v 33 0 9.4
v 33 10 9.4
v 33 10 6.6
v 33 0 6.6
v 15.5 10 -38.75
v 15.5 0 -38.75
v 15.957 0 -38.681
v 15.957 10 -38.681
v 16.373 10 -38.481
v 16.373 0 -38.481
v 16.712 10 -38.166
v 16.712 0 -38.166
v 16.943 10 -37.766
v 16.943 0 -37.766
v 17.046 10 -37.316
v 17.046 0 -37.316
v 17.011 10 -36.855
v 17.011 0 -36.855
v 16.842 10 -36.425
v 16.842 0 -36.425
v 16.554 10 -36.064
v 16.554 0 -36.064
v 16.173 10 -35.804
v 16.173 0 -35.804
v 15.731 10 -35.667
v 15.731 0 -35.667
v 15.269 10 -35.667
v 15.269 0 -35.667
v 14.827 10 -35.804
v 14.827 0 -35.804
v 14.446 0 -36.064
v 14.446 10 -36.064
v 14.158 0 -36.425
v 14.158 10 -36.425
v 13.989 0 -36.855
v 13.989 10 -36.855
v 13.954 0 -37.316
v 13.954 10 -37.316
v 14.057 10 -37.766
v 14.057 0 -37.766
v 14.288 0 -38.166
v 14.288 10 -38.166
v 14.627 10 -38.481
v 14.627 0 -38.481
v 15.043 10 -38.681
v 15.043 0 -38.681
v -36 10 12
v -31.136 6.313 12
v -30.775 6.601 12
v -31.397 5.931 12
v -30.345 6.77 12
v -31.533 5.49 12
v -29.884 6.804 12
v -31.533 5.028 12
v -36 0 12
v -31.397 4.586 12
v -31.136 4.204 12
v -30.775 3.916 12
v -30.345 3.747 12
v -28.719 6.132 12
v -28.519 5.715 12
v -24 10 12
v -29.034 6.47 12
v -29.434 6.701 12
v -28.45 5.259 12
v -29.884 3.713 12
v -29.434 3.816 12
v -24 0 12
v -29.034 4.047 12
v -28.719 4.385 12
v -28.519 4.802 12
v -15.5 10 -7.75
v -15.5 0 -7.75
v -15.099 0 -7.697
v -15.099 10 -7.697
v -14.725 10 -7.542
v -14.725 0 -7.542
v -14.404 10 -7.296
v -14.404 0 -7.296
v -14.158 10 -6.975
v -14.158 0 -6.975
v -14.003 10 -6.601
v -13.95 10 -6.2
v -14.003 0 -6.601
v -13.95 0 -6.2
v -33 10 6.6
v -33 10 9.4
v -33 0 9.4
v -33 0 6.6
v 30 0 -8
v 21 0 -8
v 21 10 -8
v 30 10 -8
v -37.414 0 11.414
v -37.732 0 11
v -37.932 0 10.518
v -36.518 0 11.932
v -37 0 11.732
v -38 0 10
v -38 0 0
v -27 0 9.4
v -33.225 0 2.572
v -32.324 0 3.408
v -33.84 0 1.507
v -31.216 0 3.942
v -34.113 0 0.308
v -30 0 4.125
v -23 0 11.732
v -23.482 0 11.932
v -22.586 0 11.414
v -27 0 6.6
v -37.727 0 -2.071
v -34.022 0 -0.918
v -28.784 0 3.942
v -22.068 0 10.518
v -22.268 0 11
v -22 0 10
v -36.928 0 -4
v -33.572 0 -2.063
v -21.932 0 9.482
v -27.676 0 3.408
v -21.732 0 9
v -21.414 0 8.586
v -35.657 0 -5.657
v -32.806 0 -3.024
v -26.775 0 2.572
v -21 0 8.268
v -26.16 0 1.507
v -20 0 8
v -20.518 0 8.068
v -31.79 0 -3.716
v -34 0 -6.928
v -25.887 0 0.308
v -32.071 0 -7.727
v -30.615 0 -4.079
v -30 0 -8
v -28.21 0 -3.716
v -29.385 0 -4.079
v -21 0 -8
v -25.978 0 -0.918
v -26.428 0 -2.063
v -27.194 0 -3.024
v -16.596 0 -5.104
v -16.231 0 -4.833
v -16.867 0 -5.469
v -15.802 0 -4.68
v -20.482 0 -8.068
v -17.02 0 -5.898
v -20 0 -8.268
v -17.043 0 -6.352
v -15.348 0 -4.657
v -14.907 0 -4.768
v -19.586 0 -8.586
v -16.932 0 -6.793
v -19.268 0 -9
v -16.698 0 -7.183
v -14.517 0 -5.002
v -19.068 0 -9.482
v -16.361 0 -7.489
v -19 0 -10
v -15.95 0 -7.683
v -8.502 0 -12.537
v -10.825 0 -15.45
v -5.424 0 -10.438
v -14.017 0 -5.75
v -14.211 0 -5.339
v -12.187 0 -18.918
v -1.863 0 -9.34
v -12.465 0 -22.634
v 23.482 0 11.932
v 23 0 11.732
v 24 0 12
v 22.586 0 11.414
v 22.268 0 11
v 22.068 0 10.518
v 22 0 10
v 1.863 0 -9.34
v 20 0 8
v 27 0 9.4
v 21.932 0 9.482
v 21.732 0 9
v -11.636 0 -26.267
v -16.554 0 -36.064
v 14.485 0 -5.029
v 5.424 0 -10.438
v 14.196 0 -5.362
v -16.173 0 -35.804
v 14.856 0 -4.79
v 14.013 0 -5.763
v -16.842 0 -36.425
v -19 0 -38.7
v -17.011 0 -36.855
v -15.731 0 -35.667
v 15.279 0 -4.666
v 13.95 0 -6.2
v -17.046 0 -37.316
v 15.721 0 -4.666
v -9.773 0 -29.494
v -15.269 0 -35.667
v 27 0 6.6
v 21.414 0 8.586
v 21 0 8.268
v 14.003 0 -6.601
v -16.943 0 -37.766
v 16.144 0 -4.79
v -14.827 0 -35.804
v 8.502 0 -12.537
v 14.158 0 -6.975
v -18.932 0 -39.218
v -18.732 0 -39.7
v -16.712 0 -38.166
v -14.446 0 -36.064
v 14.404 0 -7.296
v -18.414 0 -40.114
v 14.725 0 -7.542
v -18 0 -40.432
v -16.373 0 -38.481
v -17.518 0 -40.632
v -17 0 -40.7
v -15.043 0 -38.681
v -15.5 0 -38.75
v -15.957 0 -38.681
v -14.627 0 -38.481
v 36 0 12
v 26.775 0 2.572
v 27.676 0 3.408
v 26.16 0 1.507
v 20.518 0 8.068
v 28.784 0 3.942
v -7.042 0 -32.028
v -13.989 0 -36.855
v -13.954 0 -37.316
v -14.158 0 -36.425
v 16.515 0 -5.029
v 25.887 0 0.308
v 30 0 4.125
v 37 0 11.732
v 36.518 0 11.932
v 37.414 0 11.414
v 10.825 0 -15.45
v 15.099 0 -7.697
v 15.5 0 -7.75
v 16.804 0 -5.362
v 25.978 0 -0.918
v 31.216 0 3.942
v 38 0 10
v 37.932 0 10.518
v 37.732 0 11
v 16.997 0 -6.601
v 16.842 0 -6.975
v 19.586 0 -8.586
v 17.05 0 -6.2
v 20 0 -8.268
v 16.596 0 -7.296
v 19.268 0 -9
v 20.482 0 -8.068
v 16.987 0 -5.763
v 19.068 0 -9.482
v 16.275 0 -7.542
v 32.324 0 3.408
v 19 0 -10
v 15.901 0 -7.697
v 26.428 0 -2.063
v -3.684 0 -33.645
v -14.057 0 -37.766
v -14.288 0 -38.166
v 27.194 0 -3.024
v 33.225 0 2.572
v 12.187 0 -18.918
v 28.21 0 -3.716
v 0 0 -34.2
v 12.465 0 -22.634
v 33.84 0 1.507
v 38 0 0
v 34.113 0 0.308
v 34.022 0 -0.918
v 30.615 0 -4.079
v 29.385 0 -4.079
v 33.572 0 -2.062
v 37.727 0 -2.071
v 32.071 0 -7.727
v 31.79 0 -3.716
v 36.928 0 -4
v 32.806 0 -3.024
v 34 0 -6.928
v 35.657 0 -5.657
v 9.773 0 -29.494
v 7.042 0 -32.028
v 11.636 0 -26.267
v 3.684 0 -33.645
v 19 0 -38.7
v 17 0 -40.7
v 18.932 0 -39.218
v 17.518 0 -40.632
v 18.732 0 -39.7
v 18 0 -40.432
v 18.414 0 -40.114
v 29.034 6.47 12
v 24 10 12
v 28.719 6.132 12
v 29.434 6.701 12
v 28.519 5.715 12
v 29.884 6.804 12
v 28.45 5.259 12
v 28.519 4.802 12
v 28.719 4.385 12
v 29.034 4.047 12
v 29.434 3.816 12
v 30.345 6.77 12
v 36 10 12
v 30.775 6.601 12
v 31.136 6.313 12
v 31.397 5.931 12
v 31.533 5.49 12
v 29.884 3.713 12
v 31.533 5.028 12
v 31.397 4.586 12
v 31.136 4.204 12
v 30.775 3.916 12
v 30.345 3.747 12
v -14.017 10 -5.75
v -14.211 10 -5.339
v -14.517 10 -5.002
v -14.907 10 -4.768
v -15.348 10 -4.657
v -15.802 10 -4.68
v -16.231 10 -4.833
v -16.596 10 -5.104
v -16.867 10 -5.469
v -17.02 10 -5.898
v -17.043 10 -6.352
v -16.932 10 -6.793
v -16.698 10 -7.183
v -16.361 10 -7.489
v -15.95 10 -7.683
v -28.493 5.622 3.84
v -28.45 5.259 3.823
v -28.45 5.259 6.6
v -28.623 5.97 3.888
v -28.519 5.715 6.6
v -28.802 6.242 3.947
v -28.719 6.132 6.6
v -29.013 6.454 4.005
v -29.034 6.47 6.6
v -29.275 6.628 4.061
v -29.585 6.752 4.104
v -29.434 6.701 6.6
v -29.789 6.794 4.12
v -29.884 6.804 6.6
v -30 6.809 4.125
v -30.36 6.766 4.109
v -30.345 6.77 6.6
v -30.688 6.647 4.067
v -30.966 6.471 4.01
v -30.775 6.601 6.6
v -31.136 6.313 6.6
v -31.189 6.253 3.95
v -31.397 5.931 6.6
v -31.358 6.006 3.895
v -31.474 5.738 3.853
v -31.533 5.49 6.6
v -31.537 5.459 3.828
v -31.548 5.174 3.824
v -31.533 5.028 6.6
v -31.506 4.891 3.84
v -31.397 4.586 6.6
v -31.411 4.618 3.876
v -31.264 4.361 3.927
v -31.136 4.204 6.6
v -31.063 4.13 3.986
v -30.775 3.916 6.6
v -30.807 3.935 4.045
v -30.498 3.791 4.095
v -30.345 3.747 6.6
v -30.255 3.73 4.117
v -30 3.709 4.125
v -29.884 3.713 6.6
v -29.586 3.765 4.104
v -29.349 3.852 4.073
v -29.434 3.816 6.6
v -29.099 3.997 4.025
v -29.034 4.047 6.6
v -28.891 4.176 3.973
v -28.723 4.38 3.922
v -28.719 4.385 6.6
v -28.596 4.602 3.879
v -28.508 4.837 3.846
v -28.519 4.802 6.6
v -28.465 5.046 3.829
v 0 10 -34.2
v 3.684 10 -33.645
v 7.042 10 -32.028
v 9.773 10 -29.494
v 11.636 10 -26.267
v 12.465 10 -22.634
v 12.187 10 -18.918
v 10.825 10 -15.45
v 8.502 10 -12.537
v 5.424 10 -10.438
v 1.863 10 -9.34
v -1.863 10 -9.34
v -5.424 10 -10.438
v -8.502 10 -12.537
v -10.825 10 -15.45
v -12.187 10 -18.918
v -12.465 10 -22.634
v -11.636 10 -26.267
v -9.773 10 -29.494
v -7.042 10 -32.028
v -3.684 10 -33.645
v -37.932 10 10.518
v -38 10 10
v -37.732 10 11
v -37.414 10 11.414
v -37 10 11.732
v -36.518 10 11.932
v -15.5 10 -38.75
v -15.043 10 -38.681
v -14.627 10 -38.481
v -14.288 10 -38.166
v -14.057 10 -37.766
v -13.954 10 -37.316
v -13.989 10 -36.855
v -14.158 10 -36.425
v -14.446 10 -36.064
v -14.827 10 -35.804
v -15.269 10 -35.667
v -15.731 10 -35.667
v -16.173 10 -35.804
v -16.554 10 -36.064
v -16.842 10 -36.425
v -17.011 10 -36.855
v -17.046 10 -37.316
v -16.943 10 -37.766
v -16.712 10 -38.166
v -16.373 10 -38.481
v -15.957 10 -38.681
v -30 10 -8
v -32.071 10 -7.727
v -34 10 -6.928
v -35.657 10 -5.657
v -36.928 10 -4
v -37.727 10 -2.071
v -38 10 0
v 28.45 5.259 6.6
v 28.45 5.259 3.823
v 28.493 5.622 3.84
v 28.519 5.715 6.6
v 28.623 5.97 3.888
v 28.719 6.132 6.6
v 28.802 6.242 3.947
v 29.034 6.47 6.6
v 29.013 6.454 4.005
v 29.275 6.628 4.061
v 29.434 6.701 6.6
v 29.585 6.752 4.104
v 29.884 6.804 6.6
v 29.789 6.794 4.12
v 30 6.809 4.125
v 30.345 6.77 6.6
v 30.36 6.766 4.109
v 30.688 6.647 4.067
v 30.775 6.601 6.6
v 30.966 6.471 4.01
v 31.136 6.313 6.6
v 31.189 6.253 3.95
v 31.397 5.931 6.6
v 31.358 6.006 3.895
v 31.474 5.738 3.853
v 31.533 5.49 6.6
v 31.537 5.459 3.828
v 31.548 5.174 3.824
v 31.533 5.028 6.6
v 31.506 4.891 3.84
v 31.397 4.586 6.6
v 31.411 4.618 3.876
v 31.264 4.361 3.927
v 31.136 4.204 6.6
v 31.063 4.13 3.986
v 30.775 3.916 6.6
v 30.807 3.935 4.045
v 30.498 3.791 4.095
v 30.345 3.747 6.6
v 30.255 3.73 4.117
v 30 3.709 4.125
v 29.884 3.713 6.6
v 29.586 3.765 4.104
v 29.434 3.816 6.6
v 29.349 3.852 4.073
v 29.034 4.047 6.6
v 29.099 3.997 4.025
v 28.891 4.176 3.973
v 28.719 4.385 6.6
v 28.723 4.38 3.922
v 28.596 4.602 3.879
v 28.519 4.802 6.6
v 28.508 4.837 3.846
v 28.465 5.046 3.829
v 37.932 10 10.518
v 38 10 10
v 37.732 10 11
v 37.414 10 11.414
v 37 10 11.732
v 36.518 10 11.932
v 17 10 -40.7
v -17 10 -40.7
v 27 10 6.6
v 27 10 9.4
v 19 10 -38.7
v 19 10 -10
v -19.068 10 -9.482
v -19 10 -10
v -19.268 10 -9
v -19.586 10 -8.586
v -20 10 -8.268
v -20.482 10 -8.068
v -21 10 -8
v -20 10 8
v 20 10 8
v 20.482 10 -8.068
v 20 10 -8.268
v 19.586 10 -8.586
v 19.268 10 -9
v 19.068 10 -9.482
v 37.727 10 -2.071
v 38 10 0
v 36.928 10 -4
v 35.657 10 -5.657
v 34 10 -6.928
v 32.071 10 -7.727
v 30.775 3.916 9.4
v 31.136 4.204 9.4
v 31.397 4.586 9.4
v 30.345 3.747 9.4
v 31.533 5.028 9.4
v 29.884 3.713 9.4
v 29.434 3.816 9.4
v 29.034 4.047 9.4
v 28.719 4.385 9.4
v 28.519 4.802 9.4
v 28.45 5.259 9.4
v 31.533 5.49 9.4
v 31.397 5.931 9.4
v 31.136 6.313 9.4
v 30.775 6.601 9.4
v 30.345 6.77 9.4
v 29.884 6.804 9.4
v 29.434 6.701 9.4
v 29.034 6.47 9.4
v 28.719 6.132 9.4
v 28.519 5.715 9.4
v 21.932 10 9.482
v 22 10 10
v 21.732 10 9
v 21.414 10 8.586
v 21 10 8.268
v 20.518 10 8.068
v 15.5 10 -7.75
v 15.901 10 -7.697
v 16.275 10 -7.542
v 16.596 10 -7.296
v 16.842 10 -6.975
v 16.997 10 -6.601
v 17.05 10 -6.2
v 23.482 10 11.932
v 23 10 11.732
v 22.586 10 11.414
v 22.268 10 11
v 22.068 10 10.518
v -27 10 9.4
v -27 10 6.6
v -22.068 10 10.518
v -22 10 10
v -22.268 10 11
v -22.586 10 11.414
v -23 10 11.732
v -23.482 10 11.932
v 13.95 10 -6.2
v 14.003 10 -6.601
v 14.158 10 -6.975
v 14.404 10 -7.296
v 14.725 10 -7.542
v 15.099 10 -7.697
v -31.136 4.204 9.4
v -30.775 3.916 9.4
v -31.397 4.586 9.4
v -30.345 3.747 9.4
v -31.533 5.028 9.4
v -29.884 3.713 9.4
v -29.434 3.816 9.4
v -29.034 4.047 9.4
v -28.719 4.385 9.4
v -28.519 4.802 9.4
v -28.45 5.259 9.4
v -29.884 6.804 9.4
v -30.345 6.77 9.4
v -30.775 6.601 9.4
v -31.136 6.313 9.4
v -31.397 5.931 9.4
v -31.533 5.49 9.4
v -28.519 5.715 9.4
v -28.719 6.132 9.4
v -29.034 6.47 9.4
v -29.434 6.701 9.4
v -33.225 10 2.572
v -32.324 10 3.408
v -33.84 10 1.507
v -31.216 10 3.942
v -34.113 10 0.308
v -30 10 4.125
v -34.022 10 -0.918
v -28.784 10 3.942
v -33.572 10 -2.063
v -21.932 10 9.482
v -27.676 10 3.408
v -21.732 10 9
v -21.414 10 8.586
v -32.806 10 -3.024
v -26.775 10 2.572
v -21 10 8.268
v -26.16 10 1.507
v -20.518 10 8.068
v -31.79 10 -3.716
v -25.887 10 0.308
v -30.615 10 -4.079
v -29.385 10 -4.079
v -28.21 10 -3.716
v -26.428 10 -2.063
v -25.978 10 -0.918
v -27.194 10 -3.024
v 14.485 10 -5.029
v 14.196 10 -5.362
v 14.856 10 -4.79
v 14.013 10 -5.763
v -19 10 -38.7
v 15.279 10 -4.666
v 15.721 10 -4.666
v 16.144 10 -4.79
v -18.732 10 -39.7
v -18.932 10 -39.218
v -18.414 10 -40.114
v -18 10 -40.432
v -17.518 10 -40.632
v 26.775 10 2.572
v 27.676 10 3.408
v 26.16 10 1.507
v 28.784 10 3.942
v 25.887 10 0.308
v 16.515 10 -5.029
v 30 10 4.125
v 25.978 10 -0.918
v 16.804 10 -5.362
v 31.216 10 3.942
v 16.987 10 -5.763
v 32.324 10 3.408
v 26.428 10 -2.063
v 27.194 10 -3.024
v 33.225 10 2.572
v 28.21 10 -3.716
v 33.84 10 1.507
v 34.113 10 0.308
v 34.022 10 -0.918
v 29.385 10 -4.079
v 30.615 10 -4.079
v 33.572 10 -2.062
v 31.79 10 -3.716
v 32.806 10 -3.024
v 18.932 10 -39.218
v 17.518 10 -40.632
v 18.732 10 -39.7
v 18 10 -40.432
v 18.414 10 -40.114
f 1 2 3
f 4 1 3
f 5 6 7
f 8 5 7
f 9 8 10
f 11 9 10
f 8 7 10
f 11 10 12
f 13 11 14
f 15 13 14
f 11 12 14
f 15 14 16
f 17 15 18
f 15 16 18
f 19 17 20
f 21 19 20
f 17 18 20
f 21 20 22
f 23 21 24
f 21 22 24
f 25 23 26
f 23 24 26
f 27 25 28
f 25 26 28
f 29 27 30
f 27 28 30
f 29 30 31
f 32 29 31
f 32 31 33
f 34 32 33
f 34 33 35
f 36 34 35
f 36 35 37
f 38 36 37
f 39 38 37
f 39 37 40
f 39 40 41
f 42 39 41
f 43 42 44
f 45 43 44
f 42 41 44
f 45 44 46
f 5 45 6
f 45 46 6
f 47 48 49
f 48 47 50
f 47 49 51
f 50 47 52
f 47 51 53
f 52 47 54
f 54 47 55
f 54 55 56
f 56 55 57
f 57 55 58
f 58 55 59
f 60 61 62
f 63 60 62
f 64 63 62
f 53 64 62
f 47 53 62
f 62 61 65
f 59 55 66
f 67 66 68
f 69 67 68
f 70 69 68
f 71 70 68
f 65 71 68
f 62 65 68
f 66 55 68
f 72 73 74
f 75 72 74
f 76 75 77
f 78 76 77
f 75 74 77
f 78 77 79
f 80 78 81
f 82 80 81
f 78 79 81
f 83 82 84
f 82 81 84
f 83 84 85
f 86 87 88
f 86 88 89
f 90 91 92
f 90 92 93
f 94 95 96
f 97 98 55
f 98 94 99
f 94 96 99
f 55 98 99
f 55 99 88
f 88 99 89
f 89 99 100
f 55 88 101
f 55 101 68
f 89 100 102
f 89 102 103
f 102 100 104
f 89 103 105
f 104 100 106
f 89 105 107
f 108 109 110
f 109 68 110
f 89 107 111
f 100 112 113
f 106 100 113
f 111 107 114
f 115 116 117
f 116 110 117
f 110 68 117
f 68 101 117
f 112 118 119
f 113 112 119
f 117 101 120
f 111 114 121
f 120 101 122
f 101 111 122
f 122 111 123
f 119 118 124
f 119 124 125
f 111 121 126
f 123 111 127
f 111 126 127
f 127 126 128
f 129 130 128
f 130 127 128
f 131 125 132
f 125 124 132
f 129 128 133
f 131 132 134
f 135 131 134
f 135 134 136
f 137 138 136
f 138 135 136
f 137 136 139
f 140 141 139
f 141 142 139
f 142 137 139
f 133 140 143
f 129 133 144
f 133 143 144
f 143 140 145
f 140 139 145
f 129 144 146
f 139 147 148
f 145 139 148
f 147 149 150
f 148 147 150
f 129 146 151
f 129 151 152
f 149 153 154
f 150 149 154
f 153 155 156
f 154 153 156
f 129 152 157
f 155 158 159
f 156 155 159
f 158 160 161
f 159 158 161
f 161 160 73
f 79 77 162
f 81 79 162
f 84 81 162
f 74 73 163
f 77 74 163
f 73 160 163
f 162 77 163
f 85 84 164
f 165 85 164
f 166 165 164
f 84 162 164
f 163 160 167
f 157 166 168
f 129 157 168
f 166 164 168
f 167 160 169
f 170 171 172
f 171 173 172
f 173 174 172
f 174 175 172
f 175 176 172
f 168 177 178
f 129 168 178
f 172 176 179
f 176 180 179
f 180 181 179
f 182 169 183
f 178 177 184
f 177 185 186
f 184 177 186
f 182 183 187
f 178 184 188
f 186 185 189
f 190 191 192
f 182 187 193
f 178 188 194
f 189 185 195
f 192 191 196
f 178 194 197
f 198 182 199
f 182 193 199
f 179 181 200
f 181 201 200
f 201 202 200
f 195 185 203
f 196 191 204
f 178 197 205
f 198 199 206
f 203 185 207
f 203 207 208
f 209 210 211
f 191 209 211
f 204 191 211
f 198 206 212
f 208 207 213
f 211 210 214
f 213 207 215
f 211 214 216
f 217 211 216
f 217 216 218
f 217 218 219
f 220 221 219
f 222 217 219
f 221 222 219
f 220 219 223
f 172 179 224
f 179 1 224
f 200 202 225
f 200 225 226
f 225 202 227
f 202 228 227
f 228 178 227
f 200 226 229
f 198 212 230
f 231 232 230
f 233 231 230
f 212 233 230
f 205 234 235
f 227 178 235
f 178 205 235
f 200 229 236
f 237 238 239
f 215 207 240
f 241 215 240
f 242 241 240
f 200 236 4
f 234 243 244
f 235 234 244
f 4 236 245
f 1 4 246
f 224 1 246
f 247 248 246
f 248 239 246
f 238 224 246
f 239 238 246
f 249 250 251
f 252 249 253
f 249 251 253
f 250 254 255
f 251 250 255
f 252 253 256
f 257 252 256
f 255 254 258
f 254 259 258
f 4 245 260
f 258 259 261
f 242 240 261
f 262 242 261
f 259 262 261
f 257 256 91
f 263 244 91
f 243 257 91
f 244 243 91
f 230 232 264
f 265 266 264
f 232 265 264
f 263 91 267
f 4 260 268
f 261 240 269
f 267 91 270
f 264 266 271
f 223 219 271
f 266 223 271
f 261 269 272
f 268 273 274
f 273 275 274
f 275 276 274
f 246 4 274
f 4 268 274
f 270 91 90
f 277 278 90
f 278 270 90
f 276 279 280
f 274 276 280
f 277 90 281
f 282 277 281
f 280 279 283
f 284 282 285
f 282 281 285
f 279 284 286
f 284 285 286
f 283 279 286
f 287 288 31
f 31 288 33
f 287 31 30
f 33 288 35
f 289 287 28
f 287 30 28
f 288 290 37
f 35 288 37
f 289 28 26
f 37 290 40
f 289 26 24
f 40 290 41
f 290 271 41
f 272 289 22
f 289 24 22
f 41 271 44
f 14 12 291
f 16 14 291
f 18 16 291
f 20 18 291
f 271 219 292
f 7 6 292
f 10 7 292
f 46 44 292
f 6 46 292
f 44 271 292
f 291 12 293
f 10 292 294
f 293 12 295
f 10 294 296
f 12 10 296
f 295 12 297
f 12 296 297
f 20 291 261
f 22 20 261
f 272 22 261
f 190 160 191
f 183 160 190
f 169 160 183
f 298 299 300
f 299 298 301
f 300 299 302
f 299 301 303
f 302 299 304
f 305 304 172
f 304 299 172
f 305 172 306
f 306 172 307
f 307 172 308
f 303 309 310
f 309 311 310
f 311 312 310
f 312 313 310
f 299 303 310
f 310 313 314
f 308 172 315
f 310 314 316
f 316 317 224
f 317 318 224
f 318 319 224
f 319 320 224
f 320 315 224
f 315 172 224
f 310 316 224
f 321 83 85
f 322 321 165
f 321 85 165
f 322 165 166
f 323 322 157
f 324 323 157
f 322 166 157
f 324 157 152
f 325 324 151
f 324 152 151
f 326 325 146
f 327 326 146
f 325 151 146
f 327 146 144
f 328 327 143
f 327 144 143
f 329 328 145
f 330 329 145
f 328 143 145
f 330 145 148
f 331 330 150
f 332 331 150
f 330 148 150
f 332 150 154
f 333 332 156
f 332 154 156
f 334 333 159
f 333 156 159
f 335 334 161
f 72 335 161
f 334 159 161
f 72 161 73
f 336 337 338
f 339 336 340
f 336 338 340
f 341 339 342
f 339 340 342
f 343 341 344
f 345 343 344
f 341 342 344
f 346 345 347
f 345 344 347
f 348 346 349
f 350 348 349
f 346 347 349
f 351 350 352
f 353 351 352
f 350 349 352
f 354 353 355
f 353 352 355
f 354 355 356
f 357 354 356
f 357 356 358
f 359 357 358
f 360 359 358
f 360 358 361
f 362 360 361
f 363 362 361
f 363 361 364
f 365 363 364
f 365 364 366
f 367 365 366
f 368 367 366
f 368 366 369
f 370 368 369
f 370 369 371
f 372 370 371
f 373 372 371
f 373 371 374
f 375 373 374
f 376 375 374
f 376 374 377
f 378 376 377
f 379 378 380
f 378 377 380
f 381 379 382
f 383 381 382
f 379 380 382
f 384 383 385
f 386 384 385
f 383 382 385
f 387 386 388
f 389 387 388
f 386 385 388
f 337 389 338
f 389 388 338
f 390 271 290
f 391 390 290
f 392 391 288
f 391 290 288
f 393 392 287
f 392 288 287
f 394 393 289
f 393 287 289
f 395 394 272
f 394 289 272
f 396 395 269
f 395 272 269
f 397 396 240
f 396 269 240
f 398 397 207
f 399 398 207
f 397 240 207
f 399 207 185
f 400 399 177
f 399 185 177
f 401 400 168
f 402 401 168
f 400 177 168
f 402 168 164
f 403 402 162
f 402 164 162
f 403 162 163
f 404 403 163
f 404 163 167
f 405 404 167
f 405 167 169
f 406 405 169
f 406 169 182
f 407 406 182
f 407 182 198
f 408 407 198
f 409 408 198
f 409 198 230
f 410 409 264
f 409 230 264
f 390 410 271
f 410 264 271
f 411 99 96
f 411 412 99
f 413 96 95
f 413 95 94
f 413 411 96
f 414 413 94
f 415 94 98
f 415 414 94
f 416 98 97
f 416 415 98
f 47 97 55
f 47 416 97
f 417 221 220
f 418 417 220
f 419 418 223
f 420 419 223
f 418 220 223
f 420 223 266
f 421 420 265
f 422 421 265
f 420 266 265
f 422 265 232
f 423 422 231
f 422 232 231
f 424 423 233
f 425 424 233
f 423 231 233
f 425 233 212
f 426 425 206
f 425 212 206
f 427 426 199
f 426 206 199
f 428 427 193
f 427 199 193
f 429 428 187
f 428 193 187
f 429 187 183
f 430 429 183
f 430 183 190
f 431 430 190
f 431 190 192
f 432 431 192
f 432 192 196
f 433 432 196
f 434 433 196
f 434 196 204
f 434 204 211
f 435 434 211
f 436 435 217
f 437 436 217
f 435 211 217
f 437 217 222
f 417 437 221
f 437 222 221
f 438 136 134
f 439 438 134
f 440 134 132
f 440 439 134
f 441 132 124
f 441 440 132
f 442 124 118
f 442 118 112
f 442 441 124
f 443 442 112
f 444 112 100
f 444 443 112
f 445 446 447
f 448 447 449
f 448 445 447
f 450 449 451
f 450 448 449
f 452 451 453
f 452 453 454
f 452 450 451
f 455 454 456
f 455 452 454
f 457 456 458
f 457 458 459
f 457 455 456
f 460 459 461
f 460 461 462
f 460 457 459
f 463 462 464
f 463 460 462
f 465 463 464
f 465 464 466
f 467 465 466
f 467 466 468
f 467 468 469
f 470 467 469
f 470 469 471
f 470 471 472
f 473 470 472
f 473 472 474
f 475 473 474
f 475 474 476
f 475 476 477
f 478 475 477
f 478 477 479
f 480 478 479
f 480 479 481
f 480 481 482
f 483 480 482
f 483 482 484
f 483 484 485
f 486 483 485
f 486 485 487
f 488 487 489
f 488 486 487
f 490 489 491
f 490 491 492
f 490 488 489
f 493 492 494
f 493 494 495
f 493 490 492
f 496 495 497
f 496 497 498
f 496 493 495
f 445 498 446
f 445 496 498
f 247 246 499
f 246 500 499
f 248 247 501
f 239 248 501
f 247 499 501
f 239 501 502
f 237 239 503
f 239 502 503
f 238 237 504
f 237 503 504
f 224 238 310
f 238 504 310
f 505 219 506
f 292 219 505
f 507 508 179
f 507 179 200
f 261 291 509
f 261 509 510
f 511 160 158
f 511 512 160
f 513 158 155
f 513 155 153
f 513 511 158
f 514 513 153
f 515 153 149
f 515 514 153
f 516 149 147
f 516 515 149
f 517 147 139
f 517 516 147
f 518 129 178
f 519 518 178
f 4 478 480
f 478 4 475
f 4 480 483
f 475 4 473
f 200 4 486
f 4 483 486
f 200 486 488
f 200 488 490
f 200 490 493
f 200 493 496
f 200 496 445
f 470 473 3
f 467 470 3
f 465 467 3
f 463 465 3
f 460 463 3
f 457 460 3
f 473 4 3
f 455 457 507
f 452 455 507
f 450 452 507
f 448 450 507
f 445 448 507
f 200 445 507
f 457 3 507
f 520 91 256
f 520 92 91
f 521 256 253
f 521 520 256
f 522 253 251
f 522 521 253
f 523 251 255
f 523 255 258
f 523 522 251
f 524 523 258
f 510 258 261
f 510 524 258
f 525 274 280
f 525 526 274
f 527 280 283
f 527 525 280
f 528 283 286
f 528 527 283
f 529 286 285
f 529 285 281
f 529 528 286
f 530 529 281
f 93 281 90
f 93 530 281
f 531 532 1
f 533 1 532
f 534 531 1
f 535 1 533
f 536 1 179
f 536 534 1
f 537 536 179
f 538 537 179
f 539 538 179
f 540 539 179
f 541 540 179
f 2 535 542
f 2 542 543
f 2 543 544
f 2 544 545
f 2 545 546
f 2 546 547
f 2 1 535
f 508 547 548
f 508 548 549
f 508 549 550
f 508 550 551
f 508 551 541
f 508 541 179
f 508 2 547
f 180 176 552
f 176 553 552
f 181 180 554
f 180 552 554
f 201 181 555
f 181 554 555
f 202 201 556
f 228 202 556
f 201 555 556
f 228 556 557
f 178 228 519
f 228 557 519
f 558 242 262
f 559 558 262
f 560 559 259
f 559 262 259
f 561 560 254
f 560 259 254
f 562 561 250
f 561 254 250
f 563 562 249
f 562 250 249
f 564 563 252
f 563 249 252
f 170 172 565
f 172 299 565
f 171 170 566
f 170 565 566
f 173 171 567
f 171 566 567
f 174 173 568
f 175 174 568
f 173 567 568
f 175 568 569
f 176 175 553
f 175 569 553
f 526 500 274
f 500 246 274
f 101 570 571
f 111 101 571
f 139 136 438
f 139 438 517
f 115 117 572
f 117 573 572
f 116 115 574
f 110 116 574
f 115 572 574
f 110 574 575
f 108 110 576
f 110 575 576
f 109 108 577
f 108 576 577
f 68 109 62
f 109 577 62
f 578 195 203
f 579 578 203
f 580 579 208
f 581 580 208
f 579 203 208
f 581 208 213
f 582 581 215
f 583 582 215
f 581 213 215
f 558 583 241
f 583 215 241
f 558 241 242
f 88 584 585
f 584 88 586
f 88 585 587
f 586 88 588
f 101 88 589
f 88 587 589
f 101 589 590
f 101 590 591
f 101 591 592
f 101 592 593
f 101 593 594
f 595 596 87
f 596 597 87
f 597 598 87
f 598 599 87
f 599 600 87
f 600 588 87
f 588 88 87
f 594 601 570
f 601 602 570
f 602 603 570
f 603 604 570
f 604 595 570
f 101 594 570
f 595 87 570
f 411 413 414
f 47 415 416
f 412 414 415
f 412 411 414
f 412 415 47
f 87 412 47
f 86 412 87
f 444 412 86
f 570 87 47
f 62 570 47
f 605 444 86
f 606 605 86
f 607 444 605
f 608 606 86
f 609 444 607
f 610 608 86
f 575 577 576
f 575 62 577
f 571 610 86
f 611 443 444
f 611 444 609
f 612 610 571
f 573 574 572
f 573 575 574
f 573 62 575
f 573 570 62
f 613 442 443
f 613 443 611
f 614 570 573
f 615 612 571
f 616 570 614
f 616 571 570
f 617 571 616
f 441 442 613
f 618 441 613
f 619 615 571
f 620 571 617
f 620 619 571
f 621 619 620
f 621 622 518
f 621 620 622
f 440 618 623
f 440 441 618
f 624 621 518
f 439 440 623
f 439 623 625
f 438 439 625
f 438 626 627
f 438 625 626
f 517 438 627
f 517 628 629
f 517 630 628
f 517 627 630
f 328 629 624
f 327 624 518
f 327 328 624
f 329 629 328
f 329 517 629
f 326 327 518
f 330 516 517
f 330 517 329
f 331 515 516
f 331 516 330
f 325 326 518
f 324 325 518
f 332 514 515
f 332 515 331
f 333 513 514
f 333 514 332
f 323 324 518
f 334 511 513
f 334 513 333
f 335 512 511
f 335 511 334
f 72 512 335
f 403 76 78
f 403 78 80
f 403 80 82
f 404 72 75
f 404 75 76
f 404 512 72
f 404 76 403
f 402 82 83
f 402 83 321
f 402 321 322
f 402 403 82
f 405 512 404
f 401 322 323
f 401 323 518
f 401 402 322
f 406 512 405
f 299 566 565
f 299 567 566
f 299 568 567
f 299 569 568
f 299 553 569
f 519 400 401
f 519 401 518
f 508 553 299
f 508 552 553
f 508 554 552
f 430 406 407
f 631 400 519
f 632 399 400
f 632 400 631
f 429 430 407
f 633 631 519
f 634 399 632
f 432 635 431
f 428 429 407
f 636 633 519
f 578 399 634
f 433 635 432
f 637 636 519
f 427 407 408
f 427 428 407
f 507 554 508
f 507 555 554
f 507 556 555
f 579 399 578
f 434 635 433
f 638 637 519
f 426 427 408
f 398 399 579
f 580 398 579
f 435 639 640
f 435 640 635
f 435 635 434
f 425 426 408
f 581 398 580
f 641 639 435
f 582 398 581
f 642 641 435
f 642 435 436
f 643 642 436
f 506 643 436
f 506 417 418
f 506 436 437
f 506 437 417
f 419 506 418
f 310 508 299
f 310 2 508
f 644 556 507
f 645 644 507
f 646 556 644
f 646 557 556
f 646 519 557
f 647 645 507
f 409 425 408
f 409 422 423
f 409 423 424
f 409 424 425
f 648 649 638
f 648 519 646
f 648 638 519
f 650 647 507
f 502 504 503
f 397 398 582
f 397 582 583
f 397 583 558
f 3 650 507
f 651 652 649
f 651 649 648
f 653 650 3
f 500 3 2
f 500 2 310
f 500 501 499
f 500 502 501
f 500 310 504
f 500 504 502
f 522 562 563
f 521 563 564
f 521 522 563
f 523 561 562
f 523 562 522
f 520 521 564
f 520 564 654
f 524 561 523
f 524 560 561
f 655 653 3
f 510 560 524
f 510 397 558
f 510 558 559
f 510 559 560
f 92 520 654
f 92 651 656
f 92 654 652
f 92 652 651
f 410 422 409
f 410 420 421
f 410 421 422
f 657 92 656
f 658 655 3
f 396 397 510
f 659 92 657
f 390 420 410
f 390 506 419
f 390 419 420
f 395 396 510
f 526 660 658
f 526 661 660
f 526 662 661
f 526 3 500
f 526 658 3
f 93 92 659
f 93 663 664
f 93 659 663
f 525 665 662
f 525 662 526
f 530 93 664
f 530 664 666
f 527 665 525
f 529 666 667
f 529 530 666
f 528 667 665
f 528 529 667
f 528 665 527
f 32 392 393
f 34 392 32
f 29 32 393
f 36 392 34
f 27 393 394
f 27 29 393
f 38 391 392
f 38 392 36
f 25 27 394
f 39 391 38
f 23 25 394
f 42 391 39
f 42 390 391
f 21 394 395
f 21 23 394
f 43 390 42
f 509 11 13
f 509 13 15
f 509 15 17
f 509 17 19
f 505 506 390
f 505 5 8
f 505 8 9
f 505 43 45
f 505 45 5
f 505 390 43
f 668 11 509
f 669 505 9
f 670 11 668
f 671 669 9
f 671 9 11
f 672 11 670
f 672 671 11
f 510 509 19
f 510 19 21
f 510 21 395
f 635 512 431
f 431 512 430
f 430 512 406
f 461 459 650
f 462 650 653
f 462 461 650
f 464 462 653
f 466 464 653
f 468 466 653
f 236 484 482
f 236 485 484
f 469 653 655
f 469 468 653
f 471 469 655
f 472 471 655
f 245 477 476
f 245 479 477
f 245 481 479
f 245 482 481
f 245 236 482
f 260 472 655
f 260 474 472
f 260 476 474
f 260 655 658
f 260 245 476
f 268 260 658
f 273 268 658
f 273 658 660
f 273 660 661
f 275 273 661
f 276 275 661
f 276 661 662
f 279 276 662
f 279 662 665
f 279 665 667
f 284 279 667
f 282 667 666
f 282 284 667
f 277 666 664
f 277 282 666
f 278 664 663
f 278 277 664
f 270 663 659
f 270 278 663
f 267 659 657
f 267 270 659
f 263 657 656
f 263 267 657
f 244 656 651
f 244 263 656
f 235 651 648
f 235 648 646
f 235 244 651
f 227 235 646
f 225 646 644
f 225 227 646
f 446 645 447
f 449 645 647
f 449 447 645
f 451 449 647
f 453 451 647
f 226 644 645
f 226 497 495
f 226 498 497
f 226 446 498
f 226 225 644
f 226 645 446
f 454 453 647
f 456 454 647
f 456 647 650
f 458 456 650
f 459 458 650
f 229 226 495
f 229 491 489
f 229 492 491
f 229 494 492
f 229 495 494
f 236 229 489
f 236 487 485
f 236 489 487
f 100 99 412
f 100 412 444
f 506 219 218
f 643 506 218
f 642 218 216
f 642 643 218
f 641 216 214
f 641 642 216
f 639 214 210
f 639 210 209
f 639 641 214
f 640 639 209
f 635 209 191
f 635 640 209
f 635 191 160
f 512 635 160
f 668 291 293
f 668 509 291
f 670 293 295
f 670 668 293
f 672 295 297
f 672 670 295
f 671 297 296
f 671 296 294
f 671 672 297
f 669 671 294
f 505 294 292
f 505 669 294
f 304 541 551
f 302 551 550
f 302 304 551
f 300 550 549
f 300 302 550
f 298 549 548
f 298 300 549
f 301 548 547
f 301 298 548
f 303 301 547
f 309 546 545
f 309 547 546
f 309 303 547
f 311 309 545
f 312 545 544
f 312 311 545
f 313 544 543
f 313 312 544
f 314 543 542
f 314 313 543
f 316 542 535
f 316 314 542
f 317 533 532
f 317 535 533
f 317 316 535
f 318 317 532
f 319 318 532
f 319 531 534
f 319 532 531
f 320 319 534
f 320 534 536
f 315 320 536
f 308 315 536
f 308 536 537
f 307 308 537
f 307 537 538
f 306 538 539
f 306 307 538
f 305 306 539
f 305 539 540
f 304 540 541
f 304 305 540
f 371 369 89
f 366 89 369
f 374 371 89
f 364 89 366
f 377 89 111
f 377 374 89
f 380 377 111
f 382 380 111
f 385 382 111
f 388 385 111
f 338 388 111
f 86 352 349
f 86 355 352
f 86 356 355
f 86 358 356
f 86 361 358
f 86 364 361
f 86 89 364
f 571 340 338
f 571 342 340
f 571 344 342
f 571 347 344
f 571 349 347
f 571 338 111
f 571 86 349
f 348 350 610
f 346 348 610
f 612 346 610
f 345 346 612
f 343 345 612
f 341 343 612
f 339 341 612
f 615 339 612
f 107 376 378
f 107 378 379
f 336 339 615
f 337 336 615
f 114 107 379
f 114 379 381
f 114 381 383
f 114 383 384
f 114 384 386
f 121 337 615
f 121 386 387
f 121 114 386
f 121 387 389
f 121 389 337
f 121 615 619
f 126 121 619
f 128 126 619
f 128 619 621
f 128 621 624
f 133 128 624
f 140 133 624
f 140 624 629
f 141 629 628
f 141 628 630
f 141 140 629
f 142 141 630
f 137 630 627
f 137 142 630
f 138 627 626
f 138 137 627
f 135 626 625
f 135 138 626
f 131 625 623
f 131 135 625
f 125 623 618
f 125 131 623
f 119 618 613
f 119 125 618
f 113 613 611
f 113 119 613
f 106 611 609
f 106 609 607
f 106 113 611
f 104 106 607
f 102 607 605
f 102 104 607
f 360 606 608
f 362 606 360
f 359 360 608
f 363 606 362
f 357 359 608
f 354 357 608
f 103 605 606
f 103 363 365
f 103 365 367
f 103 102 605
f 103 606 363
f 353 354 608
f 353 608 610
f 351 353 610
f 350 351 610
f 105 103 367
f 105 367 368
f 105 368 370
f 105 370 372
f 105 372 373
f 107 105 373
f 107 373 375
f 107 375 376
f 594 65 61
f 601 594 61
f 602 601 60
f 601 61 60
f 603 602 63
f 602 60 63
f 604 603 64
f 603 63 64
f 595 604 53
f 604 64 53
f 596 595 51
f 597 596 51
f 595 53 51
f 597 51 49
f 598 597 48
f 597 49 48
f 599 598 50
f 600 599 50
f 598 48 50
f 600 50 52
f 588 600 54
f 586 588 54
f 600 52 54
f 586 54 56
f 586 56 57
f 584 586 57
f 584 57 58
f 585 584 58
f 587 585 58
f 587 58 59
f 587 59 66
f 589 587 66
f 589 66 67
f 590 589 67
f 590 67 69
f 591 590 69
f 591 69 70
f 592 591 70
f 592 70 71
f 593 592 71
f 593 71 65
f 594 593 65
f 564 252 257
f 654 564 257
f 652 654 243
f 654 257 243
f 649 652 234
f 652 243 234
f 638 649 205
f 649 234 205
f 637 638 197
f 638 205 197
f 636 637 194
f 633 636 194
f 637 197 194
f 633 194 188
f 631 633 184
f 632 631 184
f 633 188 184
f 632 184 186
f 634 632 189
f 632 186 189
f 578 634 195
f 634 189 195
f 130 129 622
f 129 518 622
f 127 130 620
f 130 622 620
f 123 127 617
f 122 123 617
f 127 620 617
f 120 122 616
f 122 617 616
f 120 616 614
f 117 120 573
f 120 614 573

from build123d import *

# Parameters (mm, degrees)
SKETCH1_W           = 16
SKETCH1_H           = 4
SKETCH1_W_2         = 76
SKETCH1_H_2         = 16
SKETCH1_R           = 4.125
BOSS_EXTRUDE1_DEPTH = 10
SKETCH2_W           = 6
SKETCH2_H           = 2.8
CUT_EXTRUDE1_DEPTH  = 10
SKETCH3_R           = 1.55
CUT_EXTRUDE2_DEPTH  = 10
FILLET1_R           = 8
FILLET2_R           = 2
SKETCH4_W           = 38
SKETCH4_H           = 32.700002283
SKETCH4_R           = 1.55
SKETCH4_R_2         = 12.5
BOSS_EXTRUDE2_DEPTH = 10
CUT_EXTRUDE3_DEPTH  = 10
FILLET4_R           = 2


with BuildPart() as part:
    # Sketch1 → Boss-Extrude1 (new body)
    # profile 1 of 3: a face of its own
    with BuildSketch(Plane(origin=(0, 0, 0), x_dir=(1, 0, 0), z_dir=(0, 1, 0))):
        with Locations((-30, -10)):
            Rectangle(SKETCH1_W, SKETCH1_H)
    # profile 2 of 3: a face of its own
    with BuildSketch(Plane(origin=(0, 0, 0), x_dir=(1, 0, 0), z_dir=(0, 1, 0))):
        Rectangle(SKETCH1_W_2, SKETCH1_H_2)
        with Locations(Location((30, 0, 0), (0, 0, 270))):
            Circle(SKETCH1_R, mode=Mode.SUBTRACT)
        with Locations(Location((-30, 2.283e-06, 0), (0, 0, 270))):
            Circle(SKETCH1_R, mode=Mode.SUBTRACT)
    # profile 3 of 3: a face of its own
    with BuildSketch(Plane(origin=(0, 0, 0), x_dir=(1, 0, 0), z_dir=(0, 1, 0))):
        with Locations((30, -10)):
            Rectangle(SKETCH1_W, SKETCH1_H)
    extrude(amount=BOSS_EXTRUDE1_DEPTH)

    # Sketch2 → Cut-Extrude1 (cut)
    with BuildSketch(Plane(origin=(0, 10, 0), x_dir=(1, 0, 0), z_dir=(0, 1, 0))):
        with Locations((-30, -7.999997717)):
            Rectangle(SKETCH2_W, SKETCH2_H)
    cut_extrude1 = extrude(amount=-CUT_EXTRUDE1_DEPTH, mode=Mode.SUBTRACT)

    # Sketch3 → Cut-Extrude2 (cut)
    with BuildSketch(Plane.XY.offset(12)):
        with Locations((-30, 5.258558289)):
            Circle(SKETCH3_R)
    cut_extrude2 = extrude(amount=-CUT_EXTRUDE2_DEPTH, mode=Mode.SUBTRACT)

    # Mirror1: Cut-Extrude1, Cut-Extrude2 across plane
    add(cut_extrude1.mirror(Plane(origin=(0, 0, 0), x_dir=(0, 0, 1), z_dir=(1, 0, 0))), mode=Mode.SUBTRACT)
    add(cut_extrude2.mirror(Plane(origin=(0, 0, 0), x_dir=(0, 0, 1), z_dir=(1, 0, 0))), mode=Mode.SUBTRACT)

    # Fillet1
    fillet1_edges = [part.edges().sort_by_distance(p)[0] for p in [
        (-38, 5, -8),
        (38, 5, -8),
    ]]
    fillet(fillet1_edges, radius=FILLET1_R)

    # Fillet2
    fillet2_edges = [part.edges().sort_by_distance(p)[0] for p in [
        (38, 5, 12),
        (22, 5, 12),
        (22, 5, 8),
        (-22, 5, 8),
        (-22, 5, 12),
        (-38, 5, 12),
    ]]
    fillet(fillet2_edges, radius=FILLET2_R - 0.0001)  # a hair under: the kernel refuses the full size

    # Sketch4 → Boss-Extrude2 (add)
    with BuildSketch(Plane.XZ):
        with Locations((0, -24.350001142)):
            Rectangle(SKETCH4_W, SKETCH4_H)
        with Locations(Location((15.5, -37.200002283, 0), (0, 0, 270))):
            Circle(SKETCH4_R, mode=Mode.SUBTRACT)
        with Locations(Location((-15.5, -37.200002283, 0), (0, 0, 270))):
            Circle(SKETCH4_R, mode=Mode.SUBTRACT)
        with Locations(Location((0, -21.700002283, 0), (0, 0, 270))):
            Circle(SKETCH4_R_2, mode=Mode.SUBTRACT)
    extrude(amount=-BOSS_EXTRUDE2_DEPTH)

    # Sketch4<3> → Cut-Extrude3 (cut)
    with BuildSketch(Plane.XZ):
        with BuildLine():
            ThreePointArc((17.05, -6.200002283), (15.5, -4.650002283), (13.95, -6.200002283))
            Line((13.95, -6.200002283), (15.5, -6.200002283))
            Line((15.5, -6.200002283), (15.5, -7.750002283))
            ThreePointArc((15.5, -7.750002283), (16.596015511, -7.296017794), (17.05, -6.200002283))
        make_face()
        with BuildLine():
            Line((15.5, -6.200002283), (13.95, -6.200002283))
            ThreePointArc((13.95, -6.200002283), (14.403984489, -7.296017794), (15.5, -7.750002283))
            Line((15.5, -7.750002283), (15.5, -6.200002283))
        make_face()
        with BuildLine():
            Line((-15.5, -7.750002283), (-15.5, -6.200002283))
            Line((-15.5, -6.200002283), (-13.95, -6.200002283))
            ThreePointArc((-13.95, -6.200002283), (-16.596015511, -5.103986772), (-15.5, -7.750002283))
        make_face()
        with BuildLine():
            Line((-13.95, -6.200002283), (-15.5, -6.200002283))
            Line((-15.5, -6.200002283), (-15.5, -7.750002283))
            ThreePointArc((-15.5, -7.750002283), (-14.403984489, -7.296017794), (-13.95, -6.200002283))
        make_face()
    extrude(amount=-CUT_EXTRUDE3_DEPTH, mode=Mode.SUBTRACT)

    # Fillet4
    fillet4_edges = [part.edges().sort_by_distance(p)[0] for p in [
        (19, 5, -8),
        (-19, 5, -8),
        (19, 5, -40.700002283),
        (-19, 5, -40.700002283),
    ]]
    fillet(fillet4_edges, radius=FILLET4_R)


solid = part.part
